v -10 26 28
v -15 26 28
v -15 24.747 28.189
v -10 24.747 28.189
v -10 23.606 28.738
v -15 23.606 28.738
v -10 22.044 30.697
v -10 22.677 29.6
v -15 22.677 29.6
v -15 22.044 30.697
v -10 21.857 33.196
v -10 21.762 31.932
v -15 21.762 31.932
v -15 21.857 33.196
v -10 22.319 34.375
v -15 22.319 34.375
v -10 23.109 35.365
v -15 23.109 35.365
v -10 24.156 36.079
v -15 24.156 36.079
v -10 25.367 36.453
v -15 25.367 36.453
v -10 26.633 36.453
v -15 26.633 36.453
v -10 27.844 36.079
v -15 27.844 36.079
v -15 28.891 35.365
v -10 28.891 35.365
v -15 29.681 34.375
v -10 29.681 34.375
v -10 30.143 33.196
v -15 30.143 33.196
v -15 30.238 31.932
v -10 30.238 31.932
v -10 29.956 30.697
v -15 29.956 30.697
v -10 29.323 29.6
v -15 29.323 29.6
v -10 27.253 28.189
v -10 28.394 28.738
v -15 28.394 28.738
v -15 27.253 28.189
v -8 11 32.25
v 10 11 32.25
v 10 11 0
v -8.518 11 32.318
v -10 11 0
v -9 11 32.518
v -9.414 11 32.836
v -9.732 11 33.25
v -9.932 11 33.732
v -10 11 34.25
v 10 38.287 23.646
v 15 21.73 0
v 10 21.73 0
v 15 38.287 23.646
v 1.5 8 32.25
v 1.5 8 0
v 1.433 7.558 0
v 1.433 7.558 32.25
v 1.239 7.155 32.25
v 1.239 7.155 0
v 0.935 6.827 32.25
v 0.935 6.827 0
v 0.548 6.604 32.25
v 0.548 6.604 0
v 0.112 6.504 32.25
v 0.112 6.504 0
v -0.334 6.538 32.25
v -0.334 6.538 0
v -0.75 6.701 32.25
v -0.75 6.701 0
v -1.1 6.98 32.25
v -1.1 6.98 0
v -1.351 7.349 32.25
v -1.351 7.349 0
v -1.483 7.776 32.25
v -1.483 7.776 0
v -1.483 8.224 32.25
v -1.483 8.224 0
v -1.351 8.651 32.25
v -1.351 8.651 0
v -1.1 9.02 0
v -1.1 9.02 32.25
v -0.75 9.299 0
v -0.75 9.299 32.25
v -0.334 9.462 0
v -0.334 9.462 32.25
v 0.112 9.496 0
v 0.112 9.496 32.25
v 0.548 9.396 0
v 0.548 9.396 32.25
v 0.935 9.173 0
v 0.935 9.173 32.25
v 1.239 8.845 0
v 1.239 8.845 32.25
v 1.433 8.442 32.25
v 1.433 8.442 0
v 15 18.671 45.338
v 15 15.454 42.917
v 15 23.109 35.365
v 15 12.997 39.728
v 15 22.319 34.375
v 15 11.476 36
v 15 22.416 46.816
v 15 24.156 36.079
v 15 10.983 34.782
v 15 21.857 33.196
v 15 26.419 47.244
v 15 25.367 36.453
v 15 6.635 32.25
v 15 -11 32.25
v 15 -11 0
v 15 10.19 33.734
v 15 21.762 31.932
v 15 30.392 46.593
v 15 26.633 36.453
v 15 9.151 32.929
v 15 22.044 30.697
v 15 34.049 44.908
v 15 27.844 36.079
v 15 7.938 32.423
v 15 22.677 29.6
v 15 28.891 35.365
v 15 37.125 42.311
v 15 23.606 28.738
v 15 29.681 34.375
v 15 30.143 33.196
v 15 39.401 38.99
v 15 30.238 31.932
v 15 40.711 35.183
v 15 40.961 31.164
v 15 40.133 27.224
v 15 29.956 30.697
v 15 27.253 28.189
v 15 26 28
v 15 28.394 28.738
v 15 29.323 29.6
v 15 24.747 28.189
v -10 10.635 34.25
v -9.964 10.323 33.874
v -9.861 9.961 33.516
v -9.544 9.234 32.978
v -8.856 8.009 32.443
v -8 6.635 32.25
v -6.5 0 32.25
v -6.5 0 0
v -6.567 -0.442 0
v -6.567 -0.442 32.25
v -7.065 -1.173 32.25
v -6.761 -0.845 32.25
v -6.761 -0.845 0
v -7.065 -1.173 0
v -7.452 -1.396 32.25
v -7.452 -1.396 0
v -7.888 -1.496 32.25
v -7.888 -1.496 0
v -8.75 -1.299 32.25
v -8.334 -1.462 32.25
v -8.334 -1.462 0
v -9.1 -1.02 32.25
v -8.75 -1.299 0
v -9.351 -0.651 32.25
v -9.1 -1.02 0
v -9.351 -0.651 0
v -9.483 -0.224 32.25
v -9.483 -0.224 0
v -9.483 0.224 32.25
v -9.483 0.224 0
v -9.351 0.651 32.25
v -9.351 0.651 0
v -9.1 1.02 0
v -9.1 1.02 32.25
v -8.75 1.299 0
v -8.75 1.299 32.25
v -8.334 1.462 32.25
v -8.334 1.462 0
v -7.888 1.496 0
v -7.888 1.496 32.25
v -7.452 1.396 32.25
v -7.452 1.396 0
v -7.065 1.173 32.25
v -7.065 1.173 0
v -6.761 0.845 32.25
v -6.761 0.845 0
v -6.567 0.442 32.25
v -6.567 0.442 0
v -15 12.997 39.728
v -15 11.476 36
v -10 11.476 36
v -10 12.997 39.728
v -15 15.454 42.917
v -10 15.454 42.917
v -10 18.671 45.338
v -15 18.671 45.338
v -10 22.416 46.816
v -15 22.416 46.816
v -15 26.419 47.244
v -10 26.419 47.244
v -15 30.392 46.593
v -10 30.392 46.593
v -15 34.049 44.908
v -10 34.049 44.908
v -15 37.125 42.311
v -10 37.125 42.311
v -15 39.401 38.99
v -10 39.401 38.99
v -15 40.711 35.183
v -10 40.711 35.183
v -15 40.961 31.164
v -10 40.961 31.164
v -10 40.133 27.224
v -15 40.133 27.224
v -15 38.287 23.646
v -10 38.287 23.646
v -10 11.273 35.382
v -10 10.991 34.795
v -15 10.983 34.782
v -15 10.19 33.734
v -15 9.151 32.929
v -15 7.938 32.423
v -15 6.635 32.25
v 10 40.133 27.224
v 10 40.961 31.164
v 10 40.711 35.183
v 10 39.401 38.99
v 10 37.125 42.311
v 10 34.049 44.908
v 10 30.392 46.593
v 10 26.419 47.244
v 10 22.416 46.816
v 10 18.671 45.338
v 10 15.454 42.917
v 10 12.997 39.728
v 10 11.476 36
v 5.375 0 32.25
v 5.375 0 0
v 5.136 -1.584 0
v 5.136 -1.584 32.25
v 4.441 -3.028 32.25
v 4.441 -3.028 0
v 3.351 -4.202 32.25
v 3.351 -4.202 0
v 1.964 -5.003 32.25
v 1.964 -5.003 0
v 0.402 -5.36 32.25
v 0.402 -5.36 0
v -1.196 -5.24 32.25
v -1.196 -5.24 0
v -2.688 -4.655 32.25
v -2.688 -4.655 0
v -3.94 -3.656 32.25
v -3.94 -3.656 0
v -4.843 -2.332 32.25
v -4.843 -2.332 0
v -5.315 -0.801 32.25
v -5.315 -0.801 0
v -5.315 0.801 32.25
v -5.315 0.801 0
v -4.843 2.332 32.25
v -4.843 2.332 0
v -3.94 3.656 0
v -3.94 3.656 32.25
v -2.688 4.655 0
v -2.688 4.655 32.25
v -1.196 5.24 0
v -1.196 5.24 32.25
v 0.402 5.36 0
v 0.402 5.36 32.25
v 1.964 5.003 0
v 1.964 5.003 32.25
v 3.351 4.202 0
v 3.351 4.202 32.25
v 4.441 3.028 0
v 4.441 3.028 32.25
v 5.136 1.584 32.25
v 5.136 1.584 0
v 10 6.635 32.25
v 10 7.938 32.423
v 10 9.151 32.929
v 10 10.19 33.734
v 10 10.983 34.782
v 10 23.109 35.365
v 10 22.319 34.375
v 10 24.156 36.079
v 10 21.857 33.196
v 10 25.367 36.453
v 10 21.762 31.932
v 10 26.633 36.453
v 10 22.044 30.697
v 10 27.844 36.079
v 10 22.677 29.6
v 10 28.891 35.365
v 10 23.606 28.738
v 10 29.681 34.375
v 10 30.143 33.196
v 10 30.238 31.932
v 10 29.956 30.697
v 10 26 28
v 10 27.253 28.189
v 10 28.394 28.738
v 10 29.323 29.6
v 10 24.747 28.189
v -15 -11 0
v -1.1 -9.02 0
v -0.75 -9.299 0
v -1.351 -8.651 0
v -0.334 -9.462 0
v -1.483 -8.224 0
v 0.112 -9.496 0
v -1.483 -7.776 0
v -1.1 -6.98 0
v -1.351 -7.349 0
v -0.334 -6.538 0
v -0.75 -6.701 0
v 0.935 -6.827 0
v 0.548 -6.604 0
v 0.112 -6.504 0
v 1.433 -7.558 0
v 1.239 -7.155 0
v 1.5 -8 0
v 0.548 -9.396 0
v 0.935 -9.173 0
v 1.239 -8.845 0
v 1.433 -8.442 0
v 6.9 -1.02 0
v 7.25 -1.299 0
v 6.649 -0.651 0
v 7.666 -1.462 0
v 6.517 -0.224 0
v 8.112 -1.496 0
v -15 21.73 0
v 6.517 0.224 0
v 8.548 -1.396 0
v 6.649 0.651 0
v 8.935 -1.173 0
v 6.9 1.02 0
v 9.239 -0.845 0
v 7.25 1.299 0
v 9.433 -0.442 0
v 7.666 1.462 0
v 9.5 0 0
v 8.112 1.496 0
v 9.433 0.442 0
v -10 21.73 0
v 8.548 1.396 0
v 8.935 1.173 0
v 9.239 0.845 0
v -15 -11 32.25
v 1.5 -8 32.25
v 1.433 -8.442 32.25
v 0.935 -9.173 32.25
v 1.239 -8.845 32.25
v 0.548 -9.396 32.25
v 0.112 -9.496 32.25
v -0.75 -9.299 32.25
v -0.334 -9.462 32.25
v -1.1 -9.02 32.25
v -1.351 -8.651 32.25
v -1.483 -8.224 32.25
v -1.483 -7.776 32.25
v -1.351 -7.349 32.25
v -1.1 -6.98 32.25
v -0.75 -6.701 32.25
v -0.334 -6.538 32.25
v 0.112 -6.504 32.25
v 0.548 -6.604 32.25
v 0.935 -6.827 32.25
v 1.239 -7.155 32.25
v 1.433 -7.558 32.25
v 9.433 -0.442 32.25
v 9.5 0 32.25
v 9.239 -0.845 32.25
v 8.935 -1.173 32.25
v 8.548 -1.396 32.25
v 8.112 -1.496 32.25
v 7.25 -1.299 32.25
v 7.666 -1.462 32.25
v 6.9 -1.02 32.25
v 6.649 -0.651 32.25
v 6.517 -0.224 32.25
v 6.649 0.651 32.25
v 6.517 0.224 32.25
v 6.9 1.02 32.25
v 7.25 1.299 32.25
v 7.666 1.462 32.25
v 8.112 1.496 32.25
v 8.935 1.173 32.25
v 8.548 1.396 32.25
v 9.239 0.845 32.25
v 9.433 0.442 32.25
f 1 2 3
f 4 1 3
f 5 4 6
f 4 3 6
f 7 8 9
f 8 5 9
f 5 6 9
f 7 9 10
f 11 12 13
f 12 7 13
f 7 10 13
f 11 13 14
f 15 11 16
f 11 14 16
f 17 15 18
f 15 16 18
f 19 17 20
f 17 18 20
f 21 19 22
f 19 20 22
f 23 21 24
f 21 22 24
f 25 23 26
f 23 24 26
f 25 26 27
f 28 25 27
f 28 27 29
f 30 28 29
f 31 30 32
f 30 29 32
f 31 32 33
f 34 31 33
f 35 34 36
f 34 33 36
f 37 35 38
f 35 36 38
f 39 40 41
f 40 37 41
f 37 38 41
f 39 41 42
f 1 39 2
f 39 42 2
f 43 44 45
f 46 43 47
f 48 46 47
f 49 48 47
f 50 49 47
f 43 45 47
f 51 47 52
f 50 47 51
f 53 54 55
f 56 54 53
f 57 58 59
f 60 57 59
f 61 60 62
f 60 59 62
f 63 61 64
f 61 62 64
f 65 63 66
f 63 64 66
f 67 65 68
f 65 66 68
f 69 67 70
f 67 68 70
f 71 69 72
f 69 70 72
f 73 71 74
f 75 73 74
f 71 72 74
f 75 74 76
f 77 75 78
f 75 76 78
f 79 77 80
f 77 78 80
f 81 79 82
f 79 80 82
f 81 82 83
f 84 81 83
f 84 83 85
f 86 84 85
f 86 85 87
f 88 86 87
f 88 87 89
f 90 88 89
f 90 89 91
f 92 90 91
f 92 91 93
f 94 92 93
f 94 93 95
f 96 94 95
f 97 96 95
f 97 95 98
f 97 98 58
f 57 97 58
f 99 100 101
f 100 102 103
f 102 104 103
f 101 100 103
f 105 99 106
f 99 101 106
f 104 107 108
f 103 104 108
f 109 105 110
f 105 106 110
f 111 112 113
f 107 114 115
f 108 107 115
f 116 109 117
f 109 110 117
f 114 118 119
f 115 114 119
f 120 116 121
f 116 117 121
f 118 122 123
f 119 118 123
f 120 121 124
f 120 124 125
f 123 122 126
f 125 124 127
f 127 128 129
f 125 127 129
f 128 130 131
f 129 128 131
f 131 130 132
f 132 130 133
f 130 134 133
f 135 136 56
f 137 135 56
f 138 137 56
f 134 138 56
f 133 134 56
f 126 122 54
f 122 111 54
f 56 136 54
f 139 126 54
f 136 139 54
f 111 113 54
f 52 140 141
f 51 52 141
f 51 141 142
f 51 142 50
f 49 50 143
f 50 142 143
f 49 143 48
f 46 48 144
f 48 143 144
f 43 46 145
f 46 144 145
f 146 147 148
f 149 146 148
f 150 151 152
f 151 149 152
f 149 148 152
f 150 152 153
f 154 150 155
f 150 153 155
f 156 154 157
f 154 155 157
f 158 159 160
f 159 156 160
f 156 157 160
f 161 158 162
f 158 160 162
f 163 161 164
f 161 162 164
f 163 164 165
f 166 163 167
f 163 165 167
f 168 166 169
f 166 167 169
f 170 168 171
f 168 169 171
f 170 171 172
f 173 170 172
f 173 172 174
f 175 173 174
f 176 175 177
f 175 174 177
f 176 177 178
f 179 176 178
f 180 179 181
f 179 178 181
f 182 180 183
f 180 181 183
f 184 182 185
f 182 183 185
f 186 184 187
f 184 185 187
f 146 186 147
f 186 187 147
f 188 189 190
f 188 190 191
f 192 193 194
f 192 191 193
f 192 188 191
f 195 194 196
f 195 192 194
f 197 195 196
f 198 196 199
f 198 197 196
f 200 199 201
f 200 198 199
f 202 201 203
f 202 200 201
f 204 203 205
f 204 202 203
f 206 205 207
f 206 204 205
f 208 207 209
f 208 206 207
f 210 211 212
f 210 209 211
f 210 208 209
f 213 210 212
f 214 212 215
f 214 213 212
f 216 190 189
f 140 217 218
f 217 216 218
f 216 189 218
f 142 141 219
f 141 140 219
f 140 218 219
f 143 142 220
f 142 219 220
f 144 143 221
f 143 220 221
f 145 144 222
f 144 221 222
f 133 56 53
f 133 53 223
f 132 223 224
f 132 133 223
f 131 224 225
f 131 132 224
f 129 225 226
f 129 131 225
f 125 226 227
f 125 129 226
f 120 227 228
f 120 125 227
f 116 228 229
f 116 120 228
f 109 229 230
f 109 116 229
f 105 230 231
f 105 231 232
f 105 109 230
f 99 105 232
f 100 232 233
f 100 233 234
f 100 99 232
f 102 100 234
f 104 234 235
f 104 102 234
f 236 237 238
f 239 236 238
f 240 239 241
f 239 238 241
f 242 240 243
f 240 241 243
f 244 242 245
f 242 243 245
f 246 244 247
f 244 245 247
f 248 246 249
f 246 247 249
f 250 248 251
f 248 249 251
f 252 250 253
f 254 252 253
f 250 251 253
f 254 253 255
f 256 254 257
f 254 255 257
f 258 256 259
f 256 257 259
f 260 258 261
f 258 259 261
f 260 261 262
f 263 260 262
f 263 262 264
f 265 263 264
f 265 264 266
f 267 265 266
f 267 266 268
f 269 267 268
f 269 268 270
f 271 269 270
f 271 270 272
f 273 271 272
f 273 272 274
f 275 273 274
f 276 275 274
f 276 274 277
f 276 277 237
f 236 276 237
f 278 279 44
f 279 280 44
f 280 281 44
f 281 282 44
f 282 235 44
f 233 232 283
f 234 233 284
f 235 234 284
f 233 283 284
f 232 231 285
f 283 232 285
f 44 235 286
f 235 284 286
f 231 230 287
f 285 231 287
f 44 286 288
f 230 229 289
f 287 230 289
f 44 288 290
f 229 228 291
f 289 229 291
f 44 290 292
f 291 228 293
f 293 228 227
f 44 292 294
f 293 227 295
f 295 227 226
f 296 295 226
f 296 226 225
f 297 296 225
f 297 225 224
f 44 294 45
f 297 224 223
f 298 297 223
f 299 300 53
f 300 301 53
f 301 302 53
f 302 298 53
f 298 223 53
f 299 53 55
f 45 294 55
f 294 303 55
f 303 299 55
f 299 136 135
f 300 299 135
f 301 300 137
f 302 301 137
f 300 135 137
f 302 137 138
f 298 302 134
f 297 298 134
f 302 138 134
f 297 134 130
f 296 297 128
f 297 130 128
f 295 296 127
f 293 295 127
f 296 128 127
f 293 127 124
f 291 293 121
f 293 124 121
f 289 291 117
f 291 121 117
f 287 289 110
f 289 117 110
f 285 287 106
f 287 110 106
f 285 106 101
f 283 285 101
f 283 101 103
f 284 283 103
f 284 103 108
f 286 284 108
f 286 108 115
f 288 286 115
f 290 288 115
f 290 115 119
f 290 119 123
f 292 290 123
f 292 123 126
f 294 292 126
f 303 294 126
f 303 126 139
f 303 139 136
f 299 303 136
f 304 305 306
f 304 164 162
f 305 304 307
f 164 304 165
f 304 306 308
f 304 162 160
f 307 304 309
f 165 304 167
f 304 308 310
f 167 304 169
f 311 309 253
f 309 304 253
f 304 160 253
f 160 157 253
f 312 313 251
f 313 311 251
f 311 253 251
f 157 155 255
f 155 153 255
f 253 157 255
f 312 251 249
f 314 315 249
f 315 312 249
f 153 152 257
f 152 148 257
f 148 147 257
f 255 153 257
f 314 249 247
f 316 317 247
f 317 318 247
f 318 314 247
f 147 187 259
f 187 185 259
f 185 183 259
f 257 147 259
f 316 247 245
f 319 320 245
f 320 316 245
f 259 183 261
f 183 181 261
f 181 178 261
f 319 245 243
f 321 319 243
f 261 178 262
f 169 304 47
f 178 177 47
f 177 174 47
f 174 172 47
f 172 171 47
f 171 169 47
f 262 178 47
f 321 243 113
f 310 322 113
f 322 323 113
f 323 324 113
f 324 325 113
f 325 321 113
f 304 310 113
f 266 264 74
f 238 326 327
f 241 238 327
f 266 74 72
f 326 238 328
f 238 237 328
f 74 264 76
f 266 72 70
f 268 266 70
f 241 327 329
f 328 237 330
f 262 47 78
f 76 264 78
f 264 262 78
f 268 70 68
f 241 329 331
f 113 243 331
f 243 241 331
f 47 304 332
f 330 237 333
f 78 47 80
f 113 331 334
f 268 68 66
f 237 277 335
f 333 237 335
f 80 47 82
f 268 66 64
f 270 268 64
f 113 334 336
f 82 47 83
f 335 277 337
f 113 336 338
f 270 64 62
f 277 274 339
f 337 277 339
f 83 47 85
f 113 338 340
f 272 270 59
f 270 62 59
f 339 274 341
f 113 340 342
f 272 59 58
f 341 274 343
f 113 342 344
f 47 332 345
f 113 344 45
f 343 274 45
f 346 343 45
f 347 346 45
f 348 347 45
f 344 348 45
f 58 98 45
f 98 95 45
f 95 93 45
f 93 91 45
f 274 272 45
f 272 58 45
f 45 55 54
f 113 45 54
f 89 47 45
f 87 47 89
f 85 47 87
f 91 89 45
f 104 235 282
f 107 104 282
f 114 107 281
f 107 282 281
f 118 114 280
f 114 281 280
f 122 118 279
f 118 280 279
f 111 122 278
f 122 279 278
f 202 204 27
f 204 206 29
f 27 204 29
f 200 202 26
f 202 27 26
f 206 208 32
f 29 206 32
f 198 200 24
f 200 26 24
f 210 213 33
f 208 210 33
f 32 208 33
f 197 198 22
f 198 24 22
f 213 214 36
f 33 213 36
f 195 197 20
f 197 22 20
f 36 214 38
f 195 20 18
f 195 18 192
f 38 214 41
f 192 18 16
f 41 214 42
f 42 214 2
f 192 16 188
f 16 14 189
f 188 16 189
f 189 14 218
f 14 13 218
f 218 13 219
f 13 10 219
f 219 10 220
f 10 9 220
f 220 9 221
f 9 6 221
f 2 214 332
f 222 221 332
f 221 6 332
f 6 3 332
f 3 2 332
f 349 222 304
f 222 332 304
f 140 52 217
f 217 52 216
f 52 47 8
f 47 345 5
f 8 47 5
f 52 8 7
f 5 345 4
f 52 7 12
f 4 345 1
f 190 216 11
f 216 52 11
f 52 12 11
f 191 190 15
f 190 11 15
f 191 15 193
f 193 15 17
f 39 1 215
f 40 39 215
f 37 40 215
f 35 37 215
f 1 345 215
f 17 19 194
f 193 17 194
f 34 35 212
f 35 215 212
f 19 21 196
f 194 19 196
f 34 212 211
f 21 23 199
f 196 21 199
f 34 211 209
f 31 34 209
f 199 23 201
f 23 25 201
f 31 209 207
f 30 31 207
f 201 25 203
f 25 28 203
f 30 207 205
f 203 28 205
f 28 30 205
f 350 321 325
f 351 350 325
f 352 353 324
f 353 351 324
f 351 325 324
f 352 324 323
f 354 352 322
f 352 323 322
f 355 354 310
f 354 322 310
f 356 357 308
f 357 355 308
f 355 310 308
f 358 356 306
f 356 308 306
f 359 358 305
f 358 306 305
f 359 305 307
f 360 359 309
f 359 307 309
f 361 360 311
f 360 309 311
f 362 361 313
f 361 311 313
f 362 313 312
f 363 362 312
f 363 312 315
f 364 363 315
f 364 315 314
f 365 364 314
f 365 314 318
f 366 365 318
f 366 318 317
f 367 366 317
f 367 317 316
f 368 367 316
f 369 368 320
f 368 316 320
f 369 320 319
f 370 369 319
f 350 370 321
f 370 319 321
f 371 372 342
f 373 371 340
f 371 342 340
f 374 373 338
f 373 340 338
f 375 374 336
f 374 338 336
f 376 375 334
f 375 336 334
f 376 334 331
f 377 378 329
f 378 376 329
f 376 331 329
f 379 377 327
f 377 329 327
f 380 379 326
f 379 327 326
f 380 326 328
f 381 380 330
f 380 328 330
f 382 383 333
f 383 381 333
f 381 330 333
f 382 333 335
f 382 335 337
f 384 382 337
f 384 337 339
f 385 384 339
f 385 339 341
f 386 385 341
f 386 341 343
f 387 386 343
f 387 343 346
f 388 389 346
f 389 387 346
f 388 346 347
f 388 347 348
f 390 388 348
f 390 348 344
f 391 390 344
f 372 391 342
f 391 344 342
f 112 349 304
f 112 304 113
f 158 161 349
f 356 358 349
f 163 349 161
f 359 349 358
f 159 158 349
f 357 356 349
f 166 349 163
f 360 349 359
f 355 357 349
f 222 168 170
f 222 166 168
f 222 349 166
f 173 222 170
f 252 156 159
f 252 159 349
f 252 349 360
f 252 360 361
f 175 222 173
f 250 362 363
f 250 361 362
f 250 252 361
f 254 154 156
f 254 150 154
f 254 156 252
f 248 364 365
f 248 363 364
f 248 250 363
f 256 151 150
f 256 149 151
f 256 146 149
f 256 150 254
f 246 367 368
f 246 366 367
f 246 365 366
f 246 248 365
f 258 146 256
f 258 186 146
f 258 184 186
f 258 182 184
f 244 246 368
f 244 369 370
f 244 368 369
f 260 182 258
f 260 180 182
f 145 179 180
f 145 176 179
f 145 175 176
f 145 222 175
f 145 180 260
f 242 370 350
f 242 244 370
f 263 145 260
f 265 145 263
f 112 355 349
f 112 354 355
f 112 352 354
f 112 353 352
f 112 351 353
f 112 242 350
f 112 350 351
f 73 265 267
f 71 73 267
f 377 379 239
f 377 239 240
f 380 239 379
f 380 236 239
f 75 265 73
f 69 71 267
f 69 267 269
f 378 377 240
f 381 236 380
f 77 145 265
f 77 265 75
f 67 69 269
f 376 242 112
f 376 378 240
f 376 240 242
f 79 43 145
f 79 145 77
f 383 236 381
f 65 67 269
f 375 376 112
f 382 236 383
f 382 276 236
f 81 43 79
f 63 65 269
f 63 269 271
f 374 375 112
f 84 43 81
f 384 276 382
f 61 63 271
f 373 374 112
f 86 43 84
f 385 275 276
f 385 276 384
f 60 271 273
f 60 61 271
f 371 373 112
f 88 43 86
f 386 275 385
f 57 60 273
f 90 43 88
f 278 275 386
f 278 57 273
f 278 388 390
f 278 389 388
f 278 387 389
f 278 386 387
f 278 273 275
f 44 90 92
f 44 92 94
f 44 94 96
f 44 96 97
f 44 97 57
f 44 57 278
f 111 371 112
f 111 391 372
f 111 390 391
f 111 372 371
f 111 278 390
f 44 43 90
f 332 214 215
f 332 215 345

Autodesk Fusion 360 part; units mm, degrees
sketch "Sketch1" plane through (0, 0, 0) normal (0, 0, 1) x (1, 0, 0)
  circle A0 centre (0, 0) radius 5.375
  line L0 (0, 0) -> (0, 45)
  line L1 (0, 0) -> (55, 0)
  line L2 (-15, -11) -> (15, -11)
  line L3 (15, -11) -> (15, 11)
  line L4 (15, 11) -> (-15, 11)
  line L5 (-15, 11) -> (-15, -11)
  circle A1 centre (0, 8) radius 1.5
  circle A2 centre (-8, 0) radius 1.5
  circle A3 centre (0, -8) radius 1.5
  circle A4 centre (8, 0) radius 1.5
  dimension "d5" = 10.75
  dimension "d9" = 3
  dimension "d10" = 8
  dimension "d12" = 360
  dimension "d14" = 3
  dimension "d27" = 30
extrude "Extrude1" add sketch "Sketch1" along normal blind 32.25 contours A0 L0 L1 L2 L3 L4 L5 A1 A4 | A0 L0 L1 L3 L4 A1 A4
sketch "Sketch2" plane through (15, 0, 0) normal (1, 0, 0) x (0, 0, -1)
  line L0 (0, -11) -> (0, 11)
  line L1 (0, 11) -> (-32.25, 11)
  line L2 (-32.25, 11) -> (-32.25, -11)
  line L3 (-32.25, -11) -> (0, -11)
  circle A0 centre (-32.25, 26) radius 4.25
  circle A1 centre (-32.25, 26) radius 15
  line L4 (0, 11) -> (0, 21.7299)
  line L5 (0, 21.7299) -> (-23.6464, 38.2873)
  dimension "d20" = 8.5
  dimension "d21" = 15
  dimension "d28" = 30
  dimension "d34" = 125
extrude "Extrude2" add sketch "Sketch2" against normal blind 5 contours L1 A1 L4 L5 | A1
ref_plane "WorkPlane1" through (0, 16.75, 24.9478) normal (1, 0, 0) x (0, 1, 0)
mirror "Mirror1" about plane through (0, 16.75, 24.9478) normal (1, 0, 0) of "Extrude2"
fillet "Fillet1" radius 5 2 edges at (-12.5, 11, 32.25) (12.5, 11, 32.25)
fillet "Fillet2" radius 2 1 edges at (-10, 8.8175, 32.25)
equation "Screw_Nut_Dia = 10 mm"
equation "Screw_Nut_bolt_Dia = 3 mm"
equation "Screw_Nut_Bolt_Pattern = 16 mm"
equation "d5 = Screw_Nut_Dia + 0.75 mm"
equation "d9 = Screw_Nut_bolt_Dia"
equation "d10 = Screw_Nut_Bolt_Pattern / 2"
equation "d13 = Screw_Nut_bolt_Dia"
equation "d14 = d13"
equation "d28 = 22 mm + 8 mm"
equation "d34 = 180 deg - 55 deg"
